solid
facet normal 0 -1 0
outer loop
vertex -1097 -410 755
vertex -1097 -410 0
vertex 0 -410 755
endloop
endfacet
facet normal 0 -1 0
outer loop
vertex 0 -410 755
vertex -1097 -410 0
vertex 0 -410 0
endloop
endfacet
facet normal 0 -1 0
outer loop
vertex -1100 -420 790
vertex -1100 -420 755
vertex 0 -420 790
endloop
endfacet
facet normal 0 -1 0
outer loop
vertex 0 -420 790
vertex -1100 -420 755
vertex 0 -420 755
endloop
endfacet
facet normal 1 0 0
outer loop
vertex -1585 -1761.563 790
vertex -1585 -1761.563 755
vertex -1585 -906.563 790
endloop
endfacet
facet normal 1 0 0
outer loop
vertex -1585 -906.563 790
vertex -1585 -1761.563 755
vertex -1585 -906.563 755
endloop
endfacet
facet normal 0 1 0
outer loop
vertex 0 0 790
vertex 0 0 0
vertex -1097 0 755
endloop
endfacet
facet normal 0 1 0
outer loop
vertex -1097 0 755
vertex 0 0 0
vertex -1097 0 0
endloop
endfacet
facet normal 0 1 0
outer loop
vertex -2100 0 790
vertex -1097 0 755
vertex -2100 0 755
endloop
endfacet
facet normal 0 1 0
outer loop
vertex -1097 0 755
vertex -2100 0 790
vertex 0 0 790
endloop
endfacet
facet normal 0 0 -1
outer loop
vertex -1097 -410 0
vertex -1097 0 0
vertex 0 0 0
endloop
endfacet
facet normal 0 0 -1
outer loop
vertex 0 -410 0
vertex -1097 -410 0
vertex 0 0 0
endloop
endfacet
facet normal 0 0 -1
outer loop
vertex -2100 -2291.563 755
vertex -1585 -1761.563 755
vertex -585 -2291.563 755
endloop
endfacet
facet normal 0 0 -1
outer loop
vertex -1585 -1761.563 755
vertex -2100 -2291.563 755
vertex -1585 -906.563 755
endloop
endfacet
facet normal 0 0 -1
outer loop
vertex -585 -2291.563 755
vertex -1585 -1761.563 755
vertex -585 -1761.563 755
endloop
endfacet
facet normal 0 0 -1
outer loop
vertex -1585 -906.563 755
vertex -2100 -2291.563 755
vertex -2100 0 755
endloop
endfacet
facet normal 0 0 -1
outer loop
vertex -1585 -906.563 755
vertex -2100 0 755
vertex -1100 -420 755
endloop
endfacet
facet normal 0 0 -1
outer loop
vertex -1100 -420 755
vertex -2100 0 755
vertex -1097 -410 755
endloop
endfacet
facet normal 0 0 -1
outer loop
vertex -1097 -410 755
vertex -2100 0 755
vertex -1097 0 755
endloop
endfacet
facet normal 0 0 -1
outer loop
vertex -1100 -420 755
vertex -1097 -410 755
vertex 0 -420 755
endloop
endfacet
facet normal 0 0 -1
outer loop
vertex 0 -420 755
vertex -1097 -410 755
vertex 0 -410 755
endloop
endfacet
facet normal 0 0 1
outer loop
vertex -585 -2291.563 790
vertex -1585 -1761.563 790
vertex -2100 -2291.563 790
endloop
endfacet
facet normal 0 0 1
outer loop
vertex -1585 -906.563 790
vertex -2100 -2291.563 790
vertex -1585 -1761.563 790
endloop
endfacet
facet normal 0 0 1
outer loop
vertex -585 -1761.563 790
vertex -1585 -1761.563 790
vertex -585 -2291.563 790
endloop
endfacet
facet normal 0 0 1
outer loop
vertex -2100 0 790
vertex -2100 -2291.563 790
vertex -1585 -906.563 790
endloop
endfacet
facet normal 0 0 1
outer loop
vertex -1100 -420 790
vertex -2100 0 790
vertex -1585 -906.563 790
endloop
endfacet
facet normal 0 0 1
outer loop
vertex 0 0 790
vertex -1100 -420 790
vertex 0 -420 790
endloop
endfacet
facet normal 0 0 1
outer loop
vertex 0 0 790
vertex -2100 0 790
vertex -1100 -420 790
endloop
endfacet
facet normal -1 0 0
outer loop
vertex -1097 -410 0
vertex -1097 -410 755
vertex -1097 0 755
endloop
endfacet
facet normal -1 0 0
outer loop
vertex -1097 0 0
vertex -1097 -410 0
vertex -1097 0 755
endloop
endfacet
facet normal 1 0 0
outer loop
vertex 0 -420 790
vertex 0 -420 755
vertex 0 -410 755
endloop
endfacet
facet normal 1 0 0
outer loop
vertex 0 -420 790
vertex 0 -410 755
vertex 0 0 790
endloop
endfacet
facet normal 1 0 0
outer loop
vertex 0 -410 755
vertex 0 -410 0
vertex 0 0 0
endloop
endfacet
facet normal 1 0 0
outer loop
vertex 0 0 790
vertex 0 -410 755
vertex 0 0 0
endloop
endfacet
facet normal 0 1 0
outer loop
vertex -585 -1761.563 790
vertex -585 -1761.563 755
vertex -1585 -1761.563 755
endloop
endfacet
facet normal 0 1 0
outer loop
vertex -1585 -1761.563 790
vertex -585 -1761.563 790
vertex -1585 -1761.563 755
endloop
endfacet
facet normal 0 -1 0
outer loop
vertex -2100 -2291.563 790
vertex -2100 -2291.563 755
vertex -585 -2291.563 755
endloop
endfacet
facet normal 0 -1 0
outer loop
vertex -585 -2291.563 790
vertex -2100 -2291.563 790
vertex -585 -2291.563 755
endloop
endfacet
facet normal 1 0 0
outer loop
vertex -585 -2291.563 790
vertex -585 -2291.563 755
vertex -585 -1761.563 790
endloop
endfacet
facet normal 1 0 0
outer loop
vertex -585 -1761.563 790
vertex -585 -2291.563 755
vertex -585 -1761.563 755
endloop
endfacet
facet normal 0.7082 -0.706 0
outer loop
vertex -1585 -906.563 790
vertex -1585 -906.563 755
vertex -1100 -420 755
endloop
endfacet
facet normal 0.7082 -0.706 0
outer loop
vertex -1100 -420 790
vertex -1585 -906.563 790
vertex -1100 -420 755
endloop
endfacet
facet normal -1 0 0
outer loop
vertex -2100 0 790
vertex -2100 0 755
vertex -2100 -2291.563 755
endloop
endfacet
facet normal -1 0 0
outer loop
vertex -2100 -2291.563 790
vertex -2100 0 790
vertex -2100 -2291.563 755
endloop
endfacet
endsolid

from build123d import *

# Parameters (mm, degrees)
F0_W     = 1097
F0_H     = 410
F1_DEPTH = 755
F2_W     = 1097
F2_H     = 410
F2_W_2   = 515
F2_H_2   = 855
F3_DEPTH = 35


with BuildPart() as f1:
    # F0 (on Top) → F1 (new body)
    with BuildSketch(Plane.XY):
        with Locations((-548.5, -205)):
            Rectangle(F0_W, F0_H)
    extrude(amount=F1_DEPTH)

    # F2 (on face) → F3 (join)
    with BuildSketch(Plane.XY.offset(755)):
        with Locations((-548.5, -205)):
            Rectangle(F2_W, F2_H)
        Polygon((-585, -1761.563459), (-1585, -1761.563459), (-2100, -1761.563459), (-2100, -2291.563459), (-585, -2291.563459), align=None)
        Polygon((-1097, -410), (-1097, 0), (-1100, 0), (-1100, -420), (0, -420), (0, -410), align=None)
        Polygon((-1100, -420), (-1100, 0), (-2100, 0), (-2100, -906.563459), (-1585, -906.563459), align=None)
        with Locations((-1842.5, -1334.063459)):
            Rectangle(F2_W_2, F2_H_2)
    extrude(amount=F3_DEPTH)


solid = f1.part
